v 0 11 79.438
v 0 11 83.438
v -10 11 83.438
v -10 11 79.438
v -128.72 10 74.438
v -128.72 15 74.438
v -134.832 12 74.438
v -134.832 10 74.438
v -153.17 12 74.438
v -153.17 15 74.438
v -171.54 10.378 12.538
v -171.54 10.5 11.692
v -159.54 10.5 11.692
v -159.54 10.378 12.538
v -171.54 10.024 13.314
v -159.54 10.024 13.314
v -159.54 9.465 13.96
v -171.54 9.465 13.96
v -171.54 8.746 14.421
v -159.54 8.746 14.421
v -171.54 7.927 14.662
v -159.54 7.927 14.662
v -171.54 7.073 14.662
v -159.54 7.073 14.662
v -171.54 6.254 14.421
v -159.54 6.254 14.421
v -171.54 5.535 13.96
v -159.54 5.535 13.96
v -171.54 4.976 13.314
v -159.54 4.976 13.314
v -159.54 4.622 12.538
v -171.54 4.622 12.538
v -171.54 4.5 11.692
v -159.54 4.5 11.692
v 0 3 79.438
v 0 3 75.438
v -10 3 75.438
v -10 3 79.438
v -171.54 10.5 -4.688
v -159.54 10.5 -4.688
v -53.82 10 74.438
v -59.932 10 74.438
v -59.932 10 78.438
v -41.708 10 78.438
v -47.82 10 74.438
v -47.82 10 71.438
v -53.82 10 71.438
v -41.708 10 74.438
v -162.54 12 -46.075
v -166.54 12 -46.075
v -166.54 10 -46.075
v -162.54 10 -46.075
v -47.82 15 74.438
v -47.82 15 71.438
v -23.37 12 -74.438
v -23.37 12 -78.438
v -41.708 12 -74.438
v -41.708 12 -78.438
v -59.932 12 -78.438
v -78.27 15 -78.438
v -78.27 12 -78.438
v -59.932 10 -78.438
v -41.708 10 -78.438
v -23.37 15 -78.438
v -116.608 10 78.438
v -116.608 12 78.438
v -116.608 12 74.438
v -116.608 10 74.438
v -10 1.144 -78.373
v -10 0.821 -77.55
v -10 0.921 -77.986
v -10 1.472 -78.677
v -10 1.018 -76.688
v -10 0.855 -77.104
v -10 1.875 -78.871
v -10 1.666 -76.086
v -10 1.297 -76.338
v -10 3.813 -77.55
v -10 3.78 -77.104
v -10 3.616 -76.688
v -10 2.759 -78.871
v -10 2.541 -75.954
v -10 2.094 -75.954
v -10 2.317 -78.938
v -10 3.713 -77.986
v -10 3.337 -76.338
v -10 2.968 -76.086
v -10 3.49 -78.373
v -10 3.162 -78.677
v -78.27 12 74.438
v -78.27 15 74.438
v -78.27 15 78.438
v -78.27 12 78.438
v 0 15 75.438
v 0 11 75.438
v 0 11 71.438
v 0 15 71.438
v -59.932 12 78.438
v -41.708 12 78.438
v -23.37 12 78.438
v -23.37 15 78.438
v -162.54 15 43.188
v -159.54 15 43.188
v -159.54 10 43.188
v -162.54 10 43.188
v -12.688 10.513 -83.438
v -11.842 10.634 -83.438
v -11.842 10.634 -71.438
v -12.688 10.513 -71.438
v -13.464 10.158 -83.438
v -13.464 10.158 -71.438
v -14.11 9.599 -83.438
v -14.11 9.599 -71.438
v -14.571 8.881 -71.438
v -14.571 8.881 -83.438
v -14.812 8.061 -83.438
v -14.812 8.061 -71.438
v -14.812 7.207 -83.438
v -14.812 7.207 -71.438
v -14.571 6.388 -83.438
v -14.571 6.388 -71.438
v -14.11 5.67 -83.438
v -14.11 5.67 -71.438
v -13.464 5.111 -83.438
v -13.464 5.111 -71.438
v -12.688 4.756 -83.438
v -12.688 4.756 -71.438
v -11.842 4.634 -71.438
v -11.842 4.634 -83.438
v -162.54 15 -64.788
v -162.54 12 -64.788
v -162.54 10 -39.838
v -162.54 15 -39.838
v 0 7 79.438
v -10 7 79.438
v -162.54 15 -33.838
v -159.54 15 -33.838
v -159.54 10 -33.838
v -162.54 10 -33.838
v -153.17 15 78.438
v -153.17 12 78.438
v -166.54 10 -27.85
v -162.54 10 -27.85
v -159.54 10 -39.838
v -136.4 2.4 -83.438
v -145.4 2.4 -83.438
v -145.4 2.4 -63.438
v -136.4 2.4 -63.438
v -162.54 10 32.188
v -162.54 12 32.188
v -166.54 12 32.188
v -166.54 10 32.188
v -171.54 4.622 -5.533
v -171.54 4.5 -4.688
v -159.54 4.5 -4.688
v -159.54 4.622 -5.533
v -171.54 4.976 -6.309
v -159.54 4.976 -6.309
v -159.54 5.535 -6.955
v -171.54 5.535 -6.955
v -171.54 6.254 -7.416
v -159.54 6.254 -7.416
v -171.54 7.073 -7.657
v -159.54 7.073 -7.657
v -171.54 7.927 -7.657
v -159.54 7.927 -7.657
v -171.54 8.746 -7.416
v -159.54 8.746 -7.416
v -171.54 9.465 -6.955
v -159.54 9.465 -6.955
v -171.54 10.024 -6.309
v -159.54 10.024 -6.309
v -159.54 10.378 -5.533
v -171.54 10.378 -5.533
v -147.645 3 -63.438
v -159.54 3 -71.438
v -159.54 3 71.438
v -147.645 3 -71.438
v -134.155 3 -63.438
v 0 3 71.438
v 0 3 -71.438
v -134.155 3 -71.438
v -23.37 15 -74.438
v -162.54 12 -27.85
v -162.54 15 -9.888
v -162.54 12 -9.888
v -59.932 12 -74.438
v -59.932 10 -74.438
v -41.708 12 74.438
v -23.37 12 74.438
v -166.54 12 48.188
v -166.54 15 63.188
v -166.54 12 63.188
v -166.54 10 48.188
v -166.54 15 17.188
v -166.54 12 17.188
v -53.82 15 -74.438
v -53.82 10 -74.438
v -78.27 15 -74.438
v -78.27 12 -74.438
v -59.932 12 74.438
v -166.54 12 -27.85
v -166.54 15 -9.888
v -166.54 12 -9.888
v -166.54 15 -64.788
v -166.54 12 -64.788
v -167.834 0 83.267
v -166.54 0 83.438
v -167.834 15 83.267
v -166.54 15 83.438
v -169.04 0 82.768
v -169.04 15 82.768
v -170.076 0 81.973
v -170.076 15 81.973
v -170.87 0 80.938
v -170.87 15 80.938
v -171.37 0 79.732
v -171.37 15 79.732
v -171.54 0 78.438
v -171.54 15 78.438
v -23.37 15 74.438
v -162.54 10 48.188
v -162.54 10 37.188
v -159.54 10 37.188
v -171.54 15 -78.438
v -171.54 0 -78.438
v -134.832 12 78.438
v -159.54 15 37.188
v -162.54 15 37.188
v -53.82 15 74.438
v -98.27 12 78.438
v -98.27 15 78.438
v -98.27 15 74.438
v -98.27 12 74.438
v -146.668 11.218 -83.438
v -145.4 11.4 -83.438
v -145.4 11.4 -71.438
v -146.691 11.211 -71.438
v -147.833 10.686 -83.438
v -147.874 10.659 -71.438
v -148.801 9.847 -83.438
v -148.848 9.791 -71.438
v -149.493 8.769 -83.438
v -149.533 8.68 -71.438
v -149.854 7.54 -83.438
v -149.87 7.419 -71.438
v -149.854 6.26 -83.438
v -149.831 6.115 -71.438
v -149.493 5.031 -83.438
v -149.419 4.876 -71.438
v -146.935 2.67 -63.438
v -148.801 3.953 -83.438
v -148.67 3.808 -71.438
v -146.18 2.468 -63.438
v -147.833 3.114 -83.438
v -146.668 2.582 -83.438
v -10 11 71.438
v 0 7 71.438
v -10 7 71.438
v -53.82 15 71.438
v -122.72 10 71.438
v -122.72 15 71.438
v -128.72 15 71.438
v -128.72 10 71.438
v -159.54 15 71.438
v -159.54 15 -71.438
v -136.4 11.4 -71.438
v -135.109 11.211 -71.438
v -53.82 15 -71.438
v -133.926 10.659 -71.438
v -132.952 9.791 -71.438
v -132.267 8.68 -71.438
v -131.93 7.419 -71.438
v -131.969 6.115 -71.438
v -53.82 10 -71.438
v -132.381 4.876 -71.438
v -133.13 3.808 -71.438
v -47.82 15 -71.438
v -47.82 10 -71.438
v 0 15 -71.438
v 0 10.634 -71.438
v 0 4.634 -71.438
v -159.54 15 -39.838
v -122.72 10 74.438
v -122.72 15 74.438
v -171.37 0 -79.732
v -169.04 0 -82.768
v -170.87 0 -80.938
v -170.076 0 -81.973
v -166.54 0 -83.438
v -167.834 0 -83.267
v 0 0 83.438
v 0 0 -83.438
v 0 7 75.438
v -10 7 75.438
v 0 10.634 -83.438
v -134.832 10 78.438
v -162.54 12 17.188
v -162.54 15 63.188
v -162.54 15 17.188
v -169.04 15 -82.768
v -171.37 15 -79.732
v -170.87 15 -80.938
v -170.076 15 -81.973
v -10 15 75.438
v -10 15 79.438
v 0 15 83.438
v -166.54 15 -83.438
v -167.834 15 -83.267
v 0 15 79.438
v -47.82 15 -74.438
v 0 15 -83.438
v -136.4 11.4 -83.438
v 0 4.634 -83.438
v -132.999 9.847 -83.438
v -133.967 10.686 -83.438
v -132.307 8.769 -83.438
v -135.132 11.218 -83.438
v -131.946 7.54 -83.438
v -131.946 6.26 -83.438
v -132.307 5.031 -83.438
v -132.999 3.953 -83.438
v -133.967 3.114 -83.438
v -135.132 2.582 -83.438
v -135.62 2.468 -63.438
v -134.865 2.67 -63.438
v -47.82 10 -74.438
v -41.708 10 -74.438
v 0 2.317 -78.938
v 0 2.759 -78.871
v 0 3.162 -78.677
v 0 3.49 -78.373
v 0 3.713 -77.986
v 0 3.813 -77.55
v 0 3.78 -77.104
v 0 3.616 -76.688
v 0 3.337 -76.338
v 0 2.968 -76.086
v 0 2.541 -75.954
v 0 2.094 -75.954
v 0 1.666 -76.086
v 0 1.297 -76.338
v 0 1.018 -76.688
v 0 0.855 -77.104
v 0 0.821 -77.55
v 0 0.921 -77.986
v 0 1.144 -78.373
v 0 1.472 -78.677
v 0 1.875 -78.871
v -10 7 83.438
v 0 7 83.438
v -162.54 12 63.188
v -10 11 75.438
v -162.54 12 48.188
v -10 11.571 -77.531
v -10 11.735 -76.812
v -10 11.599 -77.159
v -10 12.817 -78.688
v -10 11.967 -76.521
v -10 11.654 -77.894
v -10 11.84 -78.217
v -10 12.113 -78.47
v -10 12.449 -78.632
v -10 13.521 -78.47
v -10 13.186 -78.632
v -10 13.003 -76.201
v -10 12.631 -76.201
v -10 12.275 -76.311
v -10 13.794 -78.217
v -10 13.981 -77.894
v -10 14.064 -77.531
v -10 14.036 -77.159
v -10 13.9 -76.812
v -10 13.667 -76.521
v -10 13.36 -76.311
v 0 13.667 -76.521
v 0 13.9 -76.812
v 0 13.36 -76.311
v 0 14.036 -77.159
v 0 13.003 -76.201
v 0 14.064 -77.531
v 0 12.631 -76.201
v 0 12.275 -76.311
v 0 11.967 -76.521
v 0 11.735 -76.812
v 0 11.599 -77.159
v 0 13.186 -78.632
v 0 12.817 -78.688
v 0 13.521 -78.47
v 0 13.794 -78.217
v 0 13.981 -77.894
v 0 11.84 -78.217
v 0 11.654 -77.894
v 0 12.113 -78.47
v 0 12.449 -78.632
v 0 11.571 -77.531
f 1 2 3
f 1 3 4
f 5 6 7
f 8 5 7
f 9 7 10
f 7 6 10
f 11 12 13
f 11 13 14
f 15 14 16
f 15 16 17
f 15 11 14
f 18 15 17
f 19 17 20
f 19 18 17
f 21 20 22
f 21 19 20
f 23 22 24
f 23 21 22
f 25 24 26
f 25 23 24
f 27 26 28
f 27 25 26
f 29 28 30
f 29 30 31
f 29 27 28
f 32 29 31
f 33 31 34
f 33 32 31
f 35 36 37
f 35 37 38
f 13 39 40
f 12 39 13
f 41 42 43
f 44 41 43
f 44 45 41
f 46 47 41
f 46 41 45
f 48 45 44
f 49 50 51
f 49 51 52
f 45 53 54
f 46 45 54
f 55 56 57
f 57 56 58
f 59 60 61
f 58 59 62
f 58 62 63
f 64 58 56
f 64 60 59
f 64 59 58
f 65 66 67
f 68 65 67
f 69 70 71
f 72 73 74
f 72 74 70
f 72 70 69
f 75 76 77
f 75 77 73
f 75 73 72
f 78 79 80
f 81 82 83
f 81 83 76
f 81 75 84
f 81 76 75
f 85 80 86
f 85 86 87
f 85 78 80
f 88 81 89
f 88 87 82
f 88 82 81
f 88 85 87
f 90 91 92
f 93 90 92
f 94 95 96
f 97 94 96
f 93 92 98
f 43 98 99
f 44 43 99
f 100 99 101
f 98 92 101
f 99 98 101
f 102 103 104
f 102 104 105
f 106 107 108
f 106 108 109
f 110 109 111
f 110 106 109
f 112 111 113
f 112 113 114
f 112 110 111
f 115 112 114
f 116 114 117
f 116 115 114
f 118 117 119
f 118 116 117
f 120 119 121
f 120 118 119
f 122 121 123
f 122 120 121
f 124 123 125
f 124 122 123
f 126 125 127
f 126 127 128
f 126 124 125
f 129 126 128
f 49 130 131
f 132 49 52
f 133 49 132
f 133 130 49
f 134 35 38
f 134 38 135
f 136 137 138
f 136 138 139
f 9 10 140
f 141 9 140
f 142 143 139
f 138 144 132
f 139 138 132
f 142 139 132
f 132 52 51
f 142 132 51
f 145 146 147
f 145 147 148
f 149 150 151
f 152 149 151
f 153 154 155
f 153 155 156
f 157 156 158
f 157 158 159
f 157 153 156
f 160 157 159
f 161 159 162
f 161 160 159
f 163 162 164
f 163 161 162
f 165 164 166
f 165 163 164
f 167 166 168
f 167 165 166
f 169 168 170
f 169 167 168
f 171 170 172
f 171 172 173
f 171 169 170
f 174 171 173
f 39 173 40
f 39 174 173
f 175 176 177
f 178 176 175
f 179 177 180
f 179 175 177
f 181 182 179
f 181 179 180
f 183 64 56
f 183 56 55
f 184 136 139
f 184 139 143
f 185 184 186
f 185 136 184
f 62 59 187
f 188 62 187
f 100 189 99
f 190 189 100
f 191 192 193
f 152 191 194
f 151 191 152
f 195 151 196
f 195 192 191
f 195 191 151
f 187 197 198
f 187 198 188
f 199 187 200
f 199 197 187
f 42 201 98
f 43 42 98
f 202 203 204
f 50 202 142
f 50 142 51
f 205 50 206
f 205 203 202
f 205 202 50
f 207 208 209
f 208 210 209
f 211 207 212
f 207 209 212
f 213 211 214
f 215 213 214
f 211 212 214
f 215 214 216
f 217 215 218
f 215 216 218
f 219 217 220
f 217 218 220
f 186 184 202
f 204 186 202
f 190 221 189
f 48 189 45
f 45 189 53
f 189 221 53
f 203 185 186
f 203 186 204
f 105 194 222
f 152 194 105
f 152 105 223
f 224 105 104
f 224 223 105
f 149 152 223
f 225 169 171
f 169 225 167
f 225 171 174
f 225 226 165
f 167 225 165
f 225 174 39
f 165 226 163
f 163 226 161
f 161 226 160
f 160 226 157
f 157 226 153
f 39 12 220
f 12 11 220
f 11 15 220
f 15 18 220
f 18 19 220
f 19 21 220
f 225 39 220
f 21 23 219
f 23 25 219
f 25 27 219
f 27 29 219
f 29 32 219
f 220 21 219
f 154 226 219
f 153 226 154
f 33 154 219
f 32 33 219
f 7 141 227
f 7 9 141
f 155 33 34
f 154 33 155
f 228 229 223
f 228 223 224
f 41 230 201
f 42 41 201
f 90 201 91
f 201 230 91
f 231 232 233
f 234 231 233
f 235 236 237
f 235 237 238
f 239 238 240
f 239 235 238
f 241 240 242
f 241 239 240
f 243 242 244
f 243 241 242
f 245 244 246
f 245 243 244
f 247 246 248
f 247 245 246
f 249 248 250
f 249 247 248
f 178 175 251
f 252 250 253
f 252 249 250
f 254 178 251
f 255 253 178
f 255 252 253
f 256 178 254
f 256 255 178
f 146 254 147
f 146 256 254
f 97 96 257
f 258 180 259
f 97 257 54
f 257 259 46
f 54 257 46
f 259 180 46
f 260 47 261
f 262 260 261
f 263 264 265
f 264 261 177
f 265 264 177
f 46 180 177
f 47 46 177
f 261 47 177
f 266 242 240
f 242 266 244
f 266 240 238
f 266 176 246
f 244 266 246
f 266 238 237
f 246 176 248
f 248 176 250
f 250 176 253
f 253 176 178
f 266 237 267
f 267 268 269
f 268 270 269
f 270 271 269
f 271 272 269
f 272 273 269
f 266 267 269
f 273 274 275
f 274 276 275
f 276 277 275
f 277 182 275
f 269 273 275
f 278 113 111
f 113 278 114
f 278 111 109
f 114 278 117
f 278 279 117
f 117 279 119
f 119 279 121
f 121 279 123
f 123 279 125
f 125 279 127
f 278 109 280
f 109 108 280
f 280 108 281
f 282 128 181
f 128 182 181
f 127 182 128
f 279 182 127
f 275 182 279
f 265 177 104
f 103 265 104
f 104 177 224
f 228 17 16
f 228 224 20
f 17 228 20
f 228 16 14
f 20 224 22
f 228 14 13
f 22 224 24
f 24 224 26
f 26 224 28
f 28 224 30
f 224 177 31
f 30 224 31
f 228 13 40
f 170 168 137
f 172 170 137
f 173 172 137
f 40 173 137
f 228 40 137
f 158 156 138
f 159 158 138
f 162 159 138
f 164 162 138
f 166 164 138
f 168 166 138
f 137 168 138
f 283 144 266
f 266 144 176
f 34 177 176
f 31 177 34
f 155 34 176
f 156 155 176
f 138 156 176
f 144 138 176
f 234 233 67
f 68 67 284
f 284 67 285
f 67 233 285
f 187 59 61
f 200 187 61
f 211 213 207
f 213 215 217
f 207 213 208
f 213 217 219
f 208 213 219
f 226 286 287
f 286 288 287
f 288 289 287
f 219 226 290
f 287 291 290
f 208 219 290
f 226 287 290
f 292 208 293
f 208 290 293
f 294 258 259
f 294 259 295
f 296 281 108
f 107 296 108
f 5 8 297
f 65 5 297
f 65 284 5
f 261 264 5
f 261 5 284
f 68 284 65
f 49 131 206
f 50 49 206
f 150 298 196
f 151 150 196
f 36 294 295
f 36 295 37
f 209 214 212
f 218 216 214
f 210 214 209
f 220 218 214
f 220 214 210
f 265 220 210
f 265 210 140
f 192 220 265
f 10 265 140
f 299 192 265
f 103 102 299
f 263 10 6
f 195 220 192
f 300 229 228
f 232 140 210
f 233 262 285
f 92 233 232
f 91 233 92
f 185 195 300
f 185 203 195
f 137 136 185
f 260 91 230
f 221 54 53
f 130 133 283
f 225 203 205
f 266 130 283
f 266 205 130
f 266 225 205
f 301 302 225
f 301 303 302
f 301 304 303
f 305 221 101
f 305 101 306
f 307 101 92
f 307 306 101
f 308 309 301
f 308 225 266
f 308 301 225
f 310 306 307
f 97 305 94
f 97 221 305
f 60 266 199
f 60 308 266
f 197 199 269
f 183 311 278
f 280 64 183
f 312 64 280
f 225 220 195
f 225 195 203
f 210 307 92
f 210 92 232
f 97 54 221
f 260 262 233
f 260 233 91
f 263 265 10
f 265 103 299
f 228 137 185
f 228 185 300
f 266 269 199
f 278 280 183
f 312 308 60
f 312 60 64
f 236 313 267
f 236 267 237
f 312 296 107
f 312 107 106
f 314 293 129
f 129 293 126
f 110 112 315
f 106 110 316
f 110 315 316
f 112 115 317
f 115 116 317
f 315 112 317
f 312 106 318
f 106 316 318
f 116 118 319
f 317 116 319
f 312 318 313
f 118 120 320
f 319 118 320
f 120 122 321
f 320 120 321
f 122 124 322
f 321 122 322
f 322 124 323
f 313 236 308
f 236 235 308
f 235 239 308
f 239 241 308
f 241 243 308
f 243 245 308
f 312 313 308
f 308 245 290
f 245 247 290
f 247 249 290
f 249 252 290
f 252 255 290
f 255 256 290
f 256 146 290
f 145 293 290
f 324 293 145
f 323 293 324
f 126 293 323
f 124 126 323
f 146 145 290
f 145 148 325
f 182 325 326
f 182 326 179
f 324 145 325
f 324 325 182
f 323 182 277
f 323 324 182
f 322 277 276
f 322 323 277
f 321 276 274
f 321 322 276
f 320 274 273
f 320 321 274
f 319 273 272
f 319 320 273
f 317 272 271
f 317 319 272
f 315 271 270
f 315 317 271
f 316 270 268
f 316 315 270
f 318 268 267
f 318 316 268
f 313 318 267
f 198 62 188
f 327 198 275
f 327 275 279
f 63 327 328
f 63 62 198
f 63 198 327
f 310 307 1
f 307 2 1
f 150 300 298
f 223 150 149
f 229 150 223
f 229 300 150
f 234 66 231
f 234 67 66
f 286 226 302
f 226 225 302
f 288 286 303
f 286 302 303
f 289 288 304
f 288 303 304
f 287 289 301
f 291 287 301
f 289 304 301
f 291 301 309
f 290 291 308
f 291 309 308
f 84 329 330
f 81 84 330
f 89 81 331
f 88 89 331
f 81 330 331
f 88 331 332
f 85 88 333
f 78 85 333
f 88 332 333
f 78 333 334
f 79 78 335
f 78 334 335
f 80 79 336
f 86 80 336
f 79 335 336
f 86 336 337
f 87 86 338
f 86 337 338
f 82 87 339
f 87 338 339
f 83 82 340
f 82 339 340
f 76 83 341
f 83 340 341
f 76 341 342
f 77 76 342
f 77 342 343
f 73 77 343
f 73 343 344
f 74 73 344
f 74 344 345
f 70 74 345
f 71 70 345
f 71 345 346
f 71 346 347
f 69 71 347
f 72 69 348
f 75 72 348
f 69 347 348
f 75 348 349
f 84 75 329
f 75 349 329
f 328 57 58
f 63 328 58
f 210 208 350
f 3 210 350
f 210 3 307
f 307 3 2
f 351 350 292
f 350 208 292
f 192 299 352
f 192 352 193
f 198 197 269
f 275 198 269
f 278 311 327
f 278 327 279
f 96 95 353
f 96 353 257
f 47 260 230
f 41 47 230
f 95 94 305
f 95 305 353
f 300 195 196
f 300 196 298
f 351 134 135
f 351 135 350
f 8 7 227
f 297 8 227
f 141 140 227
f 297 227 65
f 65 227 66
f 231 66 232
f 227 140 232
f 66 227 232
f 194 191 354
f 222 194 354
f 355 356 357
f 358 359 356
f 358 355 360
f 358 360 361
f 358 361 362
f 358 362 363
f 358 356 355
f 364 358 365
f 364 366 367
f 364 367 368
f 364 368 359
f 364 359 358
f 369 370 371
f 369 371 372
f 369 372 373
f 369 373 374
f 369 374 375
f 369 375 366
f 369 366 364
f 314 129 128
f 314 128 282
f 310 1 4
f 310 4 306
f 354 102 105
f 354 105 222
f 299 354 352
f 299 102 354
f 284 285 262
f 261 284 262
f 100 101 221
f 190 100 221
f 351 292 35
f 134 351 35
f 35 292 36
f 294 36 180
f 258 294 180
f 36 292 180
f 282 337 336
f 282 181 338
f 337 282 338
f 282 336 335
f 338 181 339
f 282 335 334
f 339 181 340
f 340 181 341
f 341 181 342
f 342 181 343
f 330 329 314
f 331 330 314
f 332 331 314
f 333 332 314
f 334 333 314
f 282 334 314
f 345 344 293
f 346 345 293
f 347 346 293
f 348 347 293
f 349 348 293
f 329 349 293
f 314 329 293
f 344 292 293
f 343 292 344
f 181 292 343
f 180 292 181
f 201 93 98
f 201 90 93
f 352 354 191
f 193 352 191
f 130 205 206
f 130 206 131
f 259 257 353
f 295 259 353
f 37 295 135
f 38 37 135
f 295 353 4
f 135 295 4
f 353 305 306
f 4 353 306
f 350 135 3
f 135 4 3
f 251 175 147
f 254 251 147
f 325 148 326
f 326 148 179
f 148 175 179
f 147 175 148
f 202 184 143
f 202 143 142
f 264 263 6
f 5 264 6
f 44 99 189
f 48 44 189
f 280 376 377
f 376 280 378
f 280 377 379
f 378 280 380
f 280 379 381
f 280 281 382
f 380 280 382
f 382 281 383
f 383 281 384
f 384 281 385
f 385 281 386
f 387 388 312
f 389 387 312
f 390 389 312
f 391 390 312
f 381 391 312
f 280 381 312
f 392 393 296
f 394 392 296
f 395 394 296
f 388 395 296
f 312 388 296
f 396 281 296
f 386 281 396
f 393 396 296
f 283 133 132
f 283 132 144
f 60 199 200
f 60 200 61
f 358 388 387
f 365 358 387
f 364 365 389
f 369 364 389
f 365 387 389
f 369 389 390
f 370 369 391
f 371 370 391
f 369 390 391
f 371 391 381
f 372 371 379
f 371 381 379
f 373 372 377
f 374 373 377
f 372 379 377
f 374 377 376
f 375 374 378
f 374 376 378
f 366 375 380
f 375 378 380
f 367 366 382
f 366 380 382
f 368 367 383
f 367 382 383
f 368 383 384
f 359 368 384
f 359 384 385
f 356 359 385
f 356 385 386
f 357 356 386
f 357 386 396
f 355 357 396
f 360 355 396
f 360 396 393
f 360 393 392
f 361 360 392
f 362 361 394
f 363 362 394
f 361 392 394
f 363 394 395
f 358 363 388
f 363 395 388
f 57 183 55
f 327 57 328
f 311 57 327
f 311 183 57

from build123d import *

# Parameters (mm, degrees)
SKETCH1_W           = 159.54
SKETCH1_H           = 142.875
BOSS_EXTRUDE1_DEPTH = 3
BOSS_EXTRUDE2_DEPTH = 15
CUT_EXTRUDE1_DEPTH  = 3
CUT_EXTRUDE2_DEPTH  = 2
CUT_EXTRUDE3_DEPTH  = 12
CUT_EXTRUDE5_DEPTH  = 12
CUT_EXTRUDE6_DEPTH  = 20
CUT_EXTRUDE8_DEPTH  = 10
FILLET2_R           = 5
FILLET3_R           = 5
SKETCH11_R          = 1.5
SKETCH11_R_2        = 1.25
CUT_EXTRUDE9_DEPTH  = 10


with BuildPart() as part:
    # Sketch1 → Boss-Extrude1 (new body)
    with BuildSketch(Plane(origin=(0, 0, 0), x_dir=(1, 0, 0), z_dir=(0, 1, 0))):
        with Locations((-79.77, 0)):
            Rectangle(SKETCH1_W, SKETCH1_H)
    extrude(amount=BOSS_EXTRUDE1_DEPTH)

    # Sketch2 → Boss-Extrude2 (add)
    with BuildSketch(Plane(origin=(0, 0, 0), x_dir=(1, 0, 0), z_dir=(0, 1, 0))):
        Polygon((0, 71.4375), (0, 83.4375), (-171.54, 83.4375), (-171.54, -83.4375), (0, -83.4375), (0, -71.4375), (-159.54, -71.4375), (-159.54, 71.4375), align=None)
    extrude(amount=BOSS_EXTRUDE2_DEPTH)

    # Sketch3 → Cut-Extrude1 (cut)
    with BuildSketch(Plane(origin=(0, 15, 0), x_dir=(1, 0, 0), z_dir=(0, 1, 0))):
        Polygon((-159.54, 39.8375), (-159.54, 33.8375), (-162.54, 33.8375), (-162.54, 9.888405135), (-166.54, 9.888405135), (-166.54, 64.788405135), (-162.54, 64.788405135), (-162.54, 39.8375), align=None)
        Polygon((-23.37, -74.4375), (-47.82, -74.4375), (-47.82, -71.4375), (-53.82, -71.4375), (-53.82, -74.4375), (-78.27, -74.4375), (-78.27, -78.4375), (-23.37, -78.4375), align=None)
        Polygon((-159.54, -37.1875), (-159.54, -43.1875), (-162.54, -43.1875), (-162.54, -63.1875), (-166.54, -63.1875), (-166.54, -17.1875), (-162.54, -17.1875), (-162.54, -37.1875), align=None)
        Polygon((-98.27, -78.4375), (-98.27, -74.4375), (-122.72, -74.4375), (-122.72, -71.4375), (-128.72, -71.4375), (-128.72, -74.4375), (-153.17, -74.4375), (-153.17, -78.4375), align=None)
        Polygon((-47.82, 74.4375), (-47.82, 71.4375), (-53.82, 71.4375), (-53.82, 74.4375), (-78.27, 74.4375), (-78.27, 78.4375), (-23.37, 78.4375), (-23.37, 74.4375), align=None)
    extrude(amount=-CUT_EXTRUDE1_DEPTH, mode=Mode.SUBTRACT)

    # Sketch4 → Cut-Extrude2 (cut)
    with BuildSketch(Plane(origin=(0, 12, 0), x_dir=(1, 0, 0), z_dir=(0, 1, 0))):
        Polygon((-53.82, 74.4375), (-53.82, 71.4375), (-47.82, 71.4375), (-47.82, 74.4375), (-41.7075, 74.4375), (-41.7075, 78.4375), (-50.82, 78.4375), (-59.9325, 78.4375), (-59.9325, 74.4375), align=None)
        Polygon((-159.54, 39.8375), (-159.54, 33.8375), (-162.54, 33.8375), (-162.54, 27.850226284), (-166.54, 27.850226284), (-166.54, 46.075226284), (-162.54, 46.075226284), (-162.54, 39.8375), align=None)
        Polygon((-166.54, -32.1875), (-166.54, -48.1875), (-162.54, -48.1875), (-162.54, -43.1875), (-159.54, -43.1875), (-159.54, -37.1875), (-162.54, -37.1875), (-162.54, -32.1875), align=None)
        Polygon((-128.72, -71.4375), (-128.72, -74.4375), (-134.8325, -74.4375), (-134.8325, -78.4375), (-116.6075, -78.4375), (-116.6075, -74.4375), (-122.72, -74.4375), (-122.72, -71.4375), align=None)
        Polygon((-53.82, -74.4375), (-59.9325, -74.4375), (-59.9325, -78.4375), (-41.7075, -78.4375), (-41.7075, -74.4375), (-47.82, -74.4375), (-47.82, -71.4375), (-53.82, -71.4375), align=None)
    extrude(amount=-CUT_EXTRUDE2_DEPTH, mode=Mode.SUBTRACT)

    # Sketch5 → Cut-Extrude3 (cut)
    with BuildSketch(Plane.ZY.offset(171.54)):
        with BuildLine():
            Line((-4.6875, 10.5), (11.6925, 10.5))
            ThreePointArc((11.6925, 10.5), (14.6925, 7.5), (11.6925, 4.5))
            Line((11.6925, 4.5), (-4.6875, 4.5))
            ThreePointArc((-4.6875, 4.5), (-7.6875, 7.5), (-4.6875, 10.5))
        make_face()
    extrude(amount=-CUT_EXTRUDE3_DEPTH, mode=Mode.SUBTRACT)

    # Sketch7 → Cut-Extrude5 (cut)
    with BuildSketch(Plane(origin=(0, 0, -83.4375), x_dir=(-1, 0, 0), z_dir=(0, 0, -1))):
        with BuildLine():
            Line((-4.5375, 10.634328206), (11.8425, 10.634328206))
            ThreePointArc((11.8425, 10.634328206), (14.8425, 7.634328206), (11.8425, 4.634328206))
            Line((11.8425, 4.634328206), (-4.5375, 4.634328206))
            ThreePointArc((-4.5375, 4.634328206), (-7.5375, 7.634328206), (-4.5375, 10.634328206))
        make_face()
    extrude(amount=-CUT_EXTRUDE5_DEPTH, mode=Mode.SUBTRACT)

    # Sketch8 → Cut-Extrude6 (cut)
    with BuildSketch(Plane(origin=(0, 0, -83.4375), x_dir=(-1, 0, 0), z_dir=(0, 0, -1))):
        with BuildLine():
            Line((136.4, 11.4), (145.4, 11.4))
            ThreePointArc((145.4, 11.4), (149.9, 6.9), (145.4, 2.4))
            Line((145.4, 2.4), (136.4, 2.4))
            ThreePointArc((136.4, 2.4), (131.9, 6.9), (136.4, 11.4))
        make_face()
    extrude(amount=-CUT_EXTRUDE6_DEPTH, mode=Mode.SUBTRACT)

    # Sketch10 → Cut-Extrude8 (cut)
    with BuildSketch(Plane(origin=(0, 0, 0), x_dir=(0, 0, -1), z_dir=(1, 0, 0))):
        Polygon((-79.4375, 15), (-75.4375, 15), (-75.4375, 11), (-71.4375, 11), (-71.4375, 7), (-75.4375, 7), (-75.4375, 3), (-79.4375, 3), (-79.4375, 7), (-83.4375, 7), (-83.4375, 11), (-79.4375, 11), align=None)
    extrude(amount=-CUT_EXTRUDE8_DEPTH, mode=Mode.SUBTRACT)

    # Fillet2
    fillet2_edges = [part.edges().sort_by_distance(p)[0] for p in [
        (-171.54, 7.5, 83.4375),
    ]]
    fillet(fillet2_edges, radius=FILLET2_R)

    # Fillet3
    fillet3_edges = [part.edges().sort_by_distance(p)[0] for p in [
        (-171.54, 7.5, -83.4375),
    ]]
    fillet(fillet3_edges, radius=FILLET3_R)

    # Sketch11 → Cut-Extrude9 (cut)
    with BuildSketch(Plane(origin=(0, 0, 0), x_dir=(0, 0, -1), z_dir=(1, 0, 0))):
        with Locations((77.4375, 2.317164103)):
            Circle(SKETCH11_R)
        with Locations((77.4375, 12.817164103)):
            Circle(SKETCH11_R_2)
    extrude(amount=-CUT_EXTRUDE9_DEPTH, mode=Mode.SUBTRACT)


solid = part.part
